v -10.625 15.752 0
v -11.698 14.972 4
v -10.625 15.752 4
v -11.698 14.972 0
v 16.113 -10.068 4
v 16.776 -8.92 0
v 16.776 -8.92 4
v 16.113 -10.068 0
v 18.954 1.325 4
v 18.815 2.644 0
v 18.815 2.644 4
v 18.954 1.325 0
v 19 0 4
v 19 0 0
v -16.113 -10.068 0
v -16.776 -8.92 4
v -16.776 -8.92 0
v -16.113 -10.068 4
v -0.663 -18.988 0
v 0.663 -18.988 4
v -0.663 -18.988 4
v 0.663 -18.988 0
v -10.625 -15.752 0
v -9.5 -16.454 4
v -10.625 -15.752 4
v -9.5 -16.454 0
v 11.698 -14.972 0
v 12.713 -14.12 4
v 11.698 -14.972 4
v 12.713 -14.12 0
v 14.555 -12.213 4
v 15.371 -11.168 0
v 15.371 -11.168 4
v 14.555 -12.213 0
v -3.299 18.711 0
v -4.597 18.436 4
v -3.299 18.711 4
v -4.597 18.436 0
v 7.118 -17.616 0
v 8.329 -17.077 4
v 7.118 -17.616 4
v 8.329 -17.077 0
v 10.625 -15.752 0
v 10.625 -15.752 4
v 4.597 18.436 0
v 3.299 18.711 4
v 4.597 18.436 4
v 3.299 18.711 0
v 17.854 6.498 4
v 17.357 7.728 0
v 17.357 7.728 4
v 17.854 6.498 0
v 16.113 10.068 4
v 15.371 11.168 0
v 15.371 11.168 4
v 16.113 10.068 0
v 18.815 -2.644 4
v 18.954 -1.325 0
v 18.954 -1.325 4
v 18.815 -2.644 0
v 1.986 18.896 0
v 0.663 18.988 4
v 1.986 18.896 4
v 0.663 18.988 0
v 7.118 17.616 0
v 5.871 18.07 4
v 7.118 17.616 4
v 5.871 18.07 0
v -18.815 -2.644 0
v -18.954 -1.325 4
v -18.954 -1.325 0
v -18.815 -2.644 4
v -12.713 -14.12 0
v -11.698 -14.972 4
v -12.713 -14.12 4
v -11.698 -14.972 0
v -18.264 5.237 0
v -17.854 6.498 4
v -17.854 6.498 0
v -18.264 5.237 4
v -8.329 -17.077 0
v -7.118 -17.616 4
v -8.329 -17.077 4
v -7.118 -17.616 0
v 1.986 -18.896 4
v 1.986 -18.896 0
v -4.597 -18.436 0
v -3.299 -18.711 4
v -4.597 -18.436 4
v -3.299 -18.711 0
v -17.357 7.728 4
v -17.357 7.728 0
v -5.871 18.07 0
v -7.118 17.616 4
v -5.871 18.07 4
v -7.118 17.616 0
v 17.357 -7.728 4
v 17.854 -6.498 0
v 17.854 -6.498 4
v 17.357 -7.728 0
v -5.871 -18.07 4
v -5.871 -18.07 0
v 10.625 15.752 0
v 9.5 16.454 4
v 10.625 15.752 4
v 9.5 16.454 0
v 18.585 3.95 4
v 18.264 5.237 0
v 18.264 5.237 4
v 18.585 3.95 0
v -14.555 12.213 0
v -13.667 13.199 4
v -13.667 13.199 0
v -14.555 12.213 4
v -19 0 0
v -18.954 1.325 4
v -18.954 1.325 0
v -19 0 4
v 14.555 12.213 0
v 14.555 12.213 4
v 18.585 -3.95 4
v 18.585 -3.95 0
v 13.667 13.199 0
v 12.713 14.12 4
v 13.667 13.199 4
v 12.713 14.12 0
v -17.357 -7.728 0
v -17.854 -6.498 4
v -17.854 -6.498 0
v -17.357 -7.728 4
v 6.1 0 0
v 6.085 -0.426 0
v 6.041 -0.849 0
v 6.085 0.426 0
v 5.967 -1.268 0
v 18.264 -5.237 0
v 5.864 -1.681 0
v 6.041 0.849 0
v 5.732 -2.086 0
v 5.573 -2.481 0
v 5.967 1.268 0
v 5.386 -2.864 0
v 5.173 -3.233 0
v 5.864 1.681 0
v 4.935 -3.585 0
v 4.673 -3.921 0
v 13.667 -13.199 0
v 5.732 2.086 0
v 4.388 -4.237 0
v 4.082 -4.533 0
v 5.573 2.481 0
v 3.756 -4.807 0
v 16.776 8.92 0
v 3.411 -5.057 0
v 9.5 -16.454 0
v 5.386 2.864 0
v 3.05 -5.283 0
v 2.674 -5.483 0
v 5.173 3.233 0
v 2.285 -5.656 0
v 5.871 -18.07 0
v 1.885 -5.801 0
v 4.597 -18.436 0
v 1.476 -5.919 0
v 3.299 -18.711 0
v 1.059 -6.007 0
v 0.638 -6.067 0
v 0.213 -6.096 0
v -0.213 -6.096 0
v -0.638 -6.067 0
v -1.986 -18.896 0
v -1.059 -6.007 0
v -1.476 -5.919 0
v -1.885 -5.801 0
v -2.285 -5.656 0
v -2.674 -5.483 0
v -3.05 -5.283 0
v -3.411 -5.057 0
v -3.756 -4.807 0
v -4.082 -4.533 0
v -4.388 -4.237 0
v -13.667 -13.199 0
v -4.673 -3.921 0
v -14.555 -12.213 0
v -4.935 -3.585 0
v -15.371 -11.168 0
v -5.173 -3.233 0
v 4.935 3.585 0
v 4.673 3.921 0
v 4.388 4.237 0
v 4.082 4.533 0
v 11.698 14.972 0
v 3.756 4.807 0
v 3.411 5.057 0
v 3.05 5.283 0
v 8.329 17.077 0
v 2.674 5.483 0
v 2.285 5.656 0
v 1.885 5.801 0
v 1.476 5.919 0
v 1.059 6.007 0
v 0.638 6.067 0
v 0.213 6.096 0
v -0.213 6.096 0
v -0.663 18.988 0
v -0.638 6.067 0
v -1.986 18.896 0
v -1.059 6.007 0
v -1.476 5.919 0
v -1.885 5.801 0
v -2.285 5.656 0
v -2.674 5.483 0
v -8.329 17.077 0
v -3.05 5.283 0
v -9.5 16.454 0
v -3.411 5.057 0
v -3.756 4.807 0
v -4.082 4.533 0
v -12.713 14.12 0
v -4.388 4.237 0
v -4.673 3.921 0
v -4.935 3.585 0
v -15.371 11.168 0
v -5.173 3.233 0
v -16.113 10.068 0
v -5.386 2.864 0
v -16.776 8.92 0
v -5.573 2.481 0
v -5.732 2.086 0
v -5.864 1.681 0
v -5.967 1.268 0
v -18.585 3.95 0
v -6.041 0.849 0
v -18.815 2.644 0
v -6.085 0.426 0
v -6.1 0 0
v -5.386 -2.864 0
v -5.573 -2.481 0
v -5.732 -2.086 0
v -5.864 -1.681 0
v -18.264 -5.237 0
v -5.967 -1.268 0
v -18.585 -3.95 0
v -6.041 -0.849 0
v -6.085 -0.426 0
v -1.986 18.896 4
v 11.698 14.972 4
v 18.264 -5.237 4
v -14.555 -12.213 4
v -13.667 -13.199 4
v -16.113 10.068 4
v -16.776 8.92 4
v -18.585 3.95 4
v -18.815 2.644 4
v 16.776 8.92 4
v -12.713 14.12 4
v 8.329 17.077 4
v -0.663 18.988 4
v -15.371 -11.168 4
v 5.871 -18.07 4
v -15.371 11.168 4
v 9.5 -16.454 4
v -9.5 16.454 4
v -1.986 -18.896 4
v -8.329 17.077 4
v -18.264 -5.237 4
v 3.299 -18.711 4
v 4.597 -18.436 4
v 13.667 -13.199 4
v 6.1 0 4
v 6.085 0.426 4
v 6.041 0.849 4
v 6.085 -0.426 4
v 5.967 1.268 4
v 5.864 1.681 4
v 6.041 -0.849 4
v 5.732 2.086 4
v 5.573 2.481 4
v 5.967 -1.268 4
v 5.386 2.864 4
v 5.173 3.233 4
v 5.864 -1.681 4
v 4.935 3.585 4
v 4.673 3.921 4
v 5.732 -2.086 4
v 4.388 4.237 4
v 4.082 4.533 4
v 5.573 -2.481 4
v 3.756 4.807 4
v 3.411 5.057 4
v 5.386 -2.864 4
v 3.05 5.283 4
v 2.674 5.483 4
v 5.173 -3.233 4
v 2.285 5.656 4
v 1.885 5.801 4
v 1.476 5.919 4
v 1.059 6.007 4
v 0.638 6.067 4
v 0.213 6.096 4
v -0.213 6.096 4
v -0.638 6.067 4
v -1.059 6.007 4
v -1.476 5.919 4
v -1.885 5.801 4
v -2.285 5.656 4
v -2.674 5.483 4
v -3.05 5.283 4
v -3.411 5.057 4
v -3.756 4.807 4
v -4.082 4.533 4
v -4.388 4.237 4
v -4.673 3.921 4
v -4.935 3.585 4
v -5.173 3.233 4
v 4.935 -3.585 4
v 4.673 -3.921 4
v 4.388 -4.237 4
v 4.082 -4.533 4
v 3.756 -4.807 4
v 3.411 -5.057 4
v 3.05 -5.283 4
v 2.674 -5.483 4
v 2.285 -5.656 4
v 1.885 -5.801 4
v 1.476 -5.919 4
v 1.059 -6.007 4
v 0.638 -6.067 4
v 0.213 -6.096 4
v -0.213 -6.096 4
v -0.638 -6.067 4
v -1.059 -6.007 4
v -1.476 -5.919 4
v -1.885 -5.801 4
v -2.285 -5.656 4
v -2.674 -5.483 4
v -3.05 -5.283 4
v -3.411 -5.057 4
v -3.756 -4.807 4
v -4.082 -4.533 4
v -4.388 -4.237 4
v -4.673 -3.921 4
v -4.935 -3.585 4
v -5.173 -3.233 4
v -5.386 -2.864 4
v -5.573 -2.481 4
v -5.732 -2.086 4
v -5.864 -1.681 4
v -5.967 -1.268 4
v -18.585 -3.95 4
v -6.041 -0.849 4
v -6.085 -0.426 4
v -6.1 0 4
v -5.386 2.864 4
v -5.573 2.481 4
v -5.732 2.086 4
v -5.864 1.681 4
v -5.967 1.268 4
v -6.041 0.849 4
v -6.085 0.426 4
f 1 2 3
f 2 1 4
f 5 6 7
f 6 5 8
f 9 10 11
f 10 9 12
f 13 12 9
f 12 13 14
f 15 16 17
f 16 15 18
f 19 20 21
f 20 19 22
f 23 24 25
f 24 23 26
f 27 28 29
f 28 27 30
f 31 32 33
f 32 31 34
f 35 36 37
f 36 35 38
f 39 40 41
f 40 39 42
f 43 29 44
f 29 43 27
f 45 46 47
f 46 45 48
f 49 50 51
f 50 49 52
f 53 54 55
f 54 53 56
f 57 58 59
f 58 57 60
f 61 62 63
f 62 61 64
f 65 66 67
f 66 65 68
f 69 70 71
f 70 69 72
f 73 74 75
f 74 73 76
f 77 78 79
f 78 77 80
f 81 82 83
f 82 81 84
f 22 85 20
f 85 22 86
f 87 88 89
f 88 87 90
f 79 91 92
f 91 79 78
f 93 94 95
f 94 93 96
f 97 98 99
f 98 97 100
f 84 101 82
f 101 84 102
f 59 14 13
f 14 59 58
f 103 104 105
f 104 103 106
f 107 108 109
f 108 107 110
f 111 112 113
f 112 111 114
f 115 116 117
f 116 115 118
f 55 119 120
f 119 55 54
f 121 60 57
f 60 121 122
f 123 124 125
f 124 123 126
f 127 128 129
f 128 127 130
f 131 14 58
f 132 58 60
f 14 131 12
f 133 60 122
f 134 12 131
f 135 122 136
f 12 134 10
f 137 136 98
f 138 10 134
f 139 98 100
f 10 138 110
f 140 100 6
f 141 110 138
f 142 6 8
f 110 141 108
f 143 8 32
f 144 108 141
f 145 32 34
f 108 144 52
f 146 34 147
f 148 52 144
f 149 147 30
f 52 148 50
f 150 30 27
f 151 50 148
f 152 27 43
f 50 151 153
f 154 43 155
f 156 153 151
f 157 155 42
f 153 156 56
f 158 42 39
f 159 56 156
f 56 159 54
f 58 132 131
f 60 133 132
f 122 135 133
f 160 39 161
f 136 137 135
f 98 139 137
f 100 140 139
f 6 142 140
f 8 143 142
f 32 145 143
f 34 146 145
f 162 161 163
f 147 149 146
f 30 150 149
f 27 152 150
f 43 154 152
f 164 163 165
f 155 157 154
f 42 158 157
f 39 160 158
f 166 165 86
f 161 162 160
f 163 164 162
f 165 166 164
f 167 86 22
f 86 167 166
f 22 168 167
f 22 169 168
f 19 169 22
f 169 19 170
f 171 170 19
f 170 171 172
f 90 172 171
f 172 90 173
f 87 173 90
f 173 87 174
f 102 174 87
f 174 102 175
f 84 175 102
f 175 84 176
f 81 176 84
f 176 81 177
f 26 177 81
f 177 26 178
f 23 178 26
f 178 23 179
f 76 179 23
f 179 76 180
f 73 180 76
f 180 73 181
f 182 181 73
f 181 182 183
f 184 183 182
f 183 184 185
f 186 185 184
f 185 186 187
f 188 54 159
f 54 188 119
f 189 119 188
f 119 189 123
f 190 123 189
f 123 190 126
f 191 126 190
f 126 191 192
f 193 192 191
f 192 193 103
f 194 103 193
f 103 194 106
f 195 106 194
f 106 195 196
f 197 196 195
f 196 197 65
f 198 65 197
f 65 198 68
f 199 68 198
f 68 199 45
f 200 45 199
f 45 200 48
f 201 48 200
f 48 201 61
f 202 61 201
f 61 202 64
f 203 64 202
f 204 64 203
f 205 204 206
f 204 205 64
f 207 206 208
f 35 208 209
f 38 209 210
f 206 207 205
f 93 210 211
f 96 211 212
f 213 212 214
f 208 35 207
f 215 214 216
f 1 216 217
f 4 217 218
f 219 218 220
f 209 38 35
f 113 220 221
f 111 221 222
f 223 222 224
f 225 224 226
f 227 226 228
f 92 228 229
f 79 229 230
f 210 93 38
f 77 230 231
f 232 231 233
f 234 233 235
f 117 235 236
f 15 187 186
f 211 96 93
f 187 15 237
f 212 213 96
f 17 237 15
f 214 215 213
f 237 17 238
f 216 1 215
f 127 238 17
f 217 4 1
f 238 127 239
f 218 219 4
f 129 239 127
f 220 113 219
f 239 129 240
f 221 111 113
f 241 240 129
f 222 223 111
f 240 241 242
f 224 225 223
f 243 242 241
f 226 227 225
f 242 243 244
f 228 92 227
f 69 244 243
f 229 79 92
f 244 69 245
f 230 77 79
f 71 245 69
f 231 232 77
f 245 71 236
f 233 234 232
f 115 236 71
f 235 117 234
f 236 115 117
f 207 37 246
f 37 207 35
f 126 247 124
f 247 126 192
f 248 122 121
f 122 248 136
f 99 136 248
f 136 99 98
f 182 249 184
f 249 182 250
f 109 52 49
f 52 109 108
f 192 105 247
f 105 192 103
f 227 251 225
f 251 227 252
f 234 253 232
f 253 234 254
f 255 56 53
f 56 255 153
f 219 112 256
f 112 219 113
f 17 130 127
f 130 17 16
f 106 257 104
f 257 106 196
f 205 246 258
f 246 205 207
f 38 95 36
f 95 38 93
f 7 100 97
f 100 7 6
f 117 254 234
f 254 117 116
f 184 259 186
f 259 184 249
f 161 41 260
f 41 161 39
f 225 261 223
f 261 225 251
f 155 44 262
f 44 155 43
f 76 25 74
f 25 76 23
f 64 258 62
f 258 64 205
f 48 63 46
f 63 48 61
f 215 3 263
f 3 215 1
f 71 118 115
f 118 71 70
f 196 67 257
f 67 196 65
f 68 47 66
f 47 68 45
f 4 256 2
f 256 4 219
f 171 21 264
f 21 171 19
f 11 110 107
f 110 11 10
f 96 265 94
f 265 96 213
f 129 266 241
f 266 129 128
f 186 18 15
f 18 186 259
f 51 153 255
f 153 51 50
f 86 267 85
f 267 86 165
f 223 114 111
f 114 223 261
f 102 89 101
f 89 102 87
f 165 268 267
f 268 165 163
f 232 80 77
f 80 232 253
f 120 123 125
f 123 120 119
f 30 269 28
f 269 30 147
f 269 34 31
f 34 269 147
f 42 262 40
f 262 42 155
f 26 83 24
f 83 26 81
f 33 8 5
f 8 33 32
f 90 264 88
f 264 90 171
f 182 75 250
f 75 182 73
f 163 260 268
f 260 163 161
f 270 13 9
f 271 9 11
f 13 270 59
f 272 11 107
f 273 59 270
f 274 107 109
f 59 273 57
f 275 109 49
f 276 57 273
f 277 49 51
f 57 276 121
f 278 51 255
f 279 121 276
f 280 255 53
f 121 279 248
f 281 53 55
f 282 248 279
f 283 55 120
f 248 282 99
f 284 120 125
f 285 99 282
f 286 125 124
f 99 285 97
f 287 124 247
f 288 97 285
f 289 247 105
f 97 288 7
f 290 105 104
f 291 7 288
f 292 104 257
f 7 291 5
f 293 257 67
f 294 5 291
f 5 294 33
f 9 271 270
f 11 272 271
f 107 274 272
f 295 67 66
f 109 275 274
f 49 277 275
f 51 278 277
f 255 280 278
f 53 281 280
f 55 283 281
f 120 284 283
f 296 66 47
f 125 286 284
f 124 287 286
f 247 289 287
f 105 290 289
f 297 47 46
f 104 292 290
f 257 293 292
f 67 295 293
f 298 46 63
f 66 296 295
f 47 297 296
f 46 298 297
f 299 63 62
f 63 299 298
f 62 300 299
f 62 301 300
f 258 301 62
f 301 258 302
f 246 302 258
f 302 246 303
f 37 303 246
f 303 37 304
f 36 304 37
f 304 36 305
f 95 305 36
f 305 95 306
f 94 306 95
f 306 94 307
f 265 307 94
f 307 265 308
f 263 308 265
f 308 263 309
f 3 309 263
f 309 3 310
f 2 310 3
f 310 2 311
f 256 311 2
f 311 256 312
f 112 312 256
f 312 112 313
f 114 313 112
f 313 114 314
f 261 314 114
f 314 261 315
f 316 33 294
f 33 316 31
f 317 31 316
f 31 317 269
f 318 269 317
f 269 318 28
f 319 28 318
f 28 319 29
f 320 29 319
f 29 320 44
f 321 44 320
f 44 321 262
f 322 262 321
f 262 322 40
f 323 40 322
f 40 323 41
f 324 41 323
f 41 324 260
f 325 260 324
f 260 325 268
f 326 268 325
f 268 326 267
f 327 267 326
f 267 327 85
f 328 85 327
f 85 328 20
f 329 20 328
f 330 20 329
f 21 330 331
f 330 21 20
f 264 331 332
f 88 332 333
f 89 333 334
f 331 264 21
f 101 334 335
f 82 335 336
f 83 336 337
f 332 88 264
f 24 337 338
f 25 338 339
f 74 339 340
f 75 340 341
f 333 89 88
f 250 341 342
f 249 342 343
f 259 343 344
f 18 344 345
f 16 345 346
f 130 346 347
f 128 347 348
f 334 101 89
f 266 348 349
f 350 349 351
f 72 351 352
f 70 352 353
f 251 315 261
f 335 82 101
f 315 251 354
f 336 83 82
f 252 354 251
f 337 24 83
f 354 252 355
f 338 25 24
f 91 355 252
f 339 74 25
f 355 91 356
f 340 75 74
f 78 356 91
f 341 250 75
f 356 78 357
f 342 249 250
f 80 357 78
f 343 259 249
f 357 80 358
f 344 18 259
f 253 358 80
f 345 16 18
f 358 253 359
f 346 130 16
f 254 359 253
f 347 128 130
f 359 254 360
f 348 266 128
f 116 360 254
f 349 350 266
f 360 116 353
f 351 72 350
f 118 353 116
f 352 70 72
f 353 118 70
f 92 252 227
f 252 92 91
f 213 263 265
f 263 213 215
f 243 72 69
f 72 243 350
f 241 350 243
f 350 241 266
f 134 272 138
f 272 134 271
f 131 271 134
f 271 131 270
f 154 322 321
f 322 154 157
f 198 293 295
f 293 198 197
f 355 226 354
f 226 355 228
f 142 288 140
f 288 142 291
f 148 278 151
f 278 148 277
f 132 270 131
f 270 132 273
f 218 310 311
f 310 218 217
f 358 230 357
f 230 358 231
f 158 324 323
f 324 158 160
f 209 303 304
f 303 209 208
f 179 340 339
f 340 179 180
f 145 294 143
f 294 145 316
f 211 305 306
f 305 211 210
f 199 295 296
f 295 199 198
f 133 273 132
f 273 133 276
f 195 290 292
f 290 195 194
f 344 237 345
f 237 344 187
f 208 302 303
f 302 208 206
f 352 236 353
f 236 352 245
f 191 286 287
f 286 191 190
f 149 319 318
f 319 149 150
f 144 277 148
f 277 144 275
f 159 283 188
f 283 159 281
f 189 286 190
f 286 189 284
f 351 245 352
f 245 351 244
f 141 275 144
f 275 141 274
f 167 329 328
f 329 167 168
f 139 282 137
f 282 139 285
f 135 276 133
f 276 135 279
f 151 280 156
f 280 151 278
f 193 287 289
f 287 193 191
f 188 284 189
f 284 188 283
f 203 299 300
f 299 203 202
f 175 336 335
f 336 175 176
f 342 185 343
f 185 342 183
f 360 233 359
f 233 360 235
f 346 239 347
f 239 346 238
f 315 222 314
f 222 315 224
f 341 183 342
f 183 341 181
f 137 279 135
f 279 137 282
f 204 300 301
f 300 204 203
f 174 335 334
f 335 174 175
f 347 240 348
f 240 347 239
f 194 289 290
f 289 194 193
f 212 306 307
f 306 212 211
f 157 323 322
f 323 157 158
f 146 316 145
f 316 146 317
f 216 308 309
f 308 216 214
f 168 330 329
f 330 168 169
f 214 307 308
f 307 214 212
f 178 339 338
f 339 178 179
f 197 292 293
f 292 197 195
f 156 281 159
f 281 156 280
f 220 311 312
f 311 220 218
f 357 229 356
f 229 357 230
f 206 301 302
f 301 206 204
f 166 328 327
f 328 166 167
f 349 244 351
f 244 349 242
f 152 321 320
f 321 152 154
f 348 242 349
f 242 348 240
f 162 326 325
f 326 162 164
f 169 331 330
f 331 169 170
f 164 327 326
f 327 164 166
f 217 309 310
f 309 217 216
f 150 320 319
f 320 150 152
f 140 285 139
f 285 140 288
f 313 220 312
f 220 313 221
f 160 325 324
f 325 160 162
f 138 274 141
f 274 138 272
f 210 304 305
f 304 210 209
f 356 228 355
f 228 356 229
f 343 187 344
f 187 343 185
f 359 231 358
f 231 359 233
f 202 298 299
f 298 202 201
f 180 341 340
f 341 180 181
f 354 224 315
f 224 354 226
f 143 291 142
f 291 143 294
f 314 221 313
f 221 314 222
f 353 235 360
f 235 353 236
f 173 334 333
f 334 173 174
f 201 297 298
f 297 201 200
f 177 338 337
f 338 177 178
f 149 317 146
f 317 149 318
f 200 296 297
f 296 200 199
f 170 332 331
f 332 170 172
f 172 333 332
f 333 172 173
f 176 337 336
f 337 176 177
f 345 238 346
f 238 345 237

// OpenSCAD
$fn=90;
difference() {
    
    cylinder(h=4, d=38);
    cylinder(h=4, d=12.2);
}
